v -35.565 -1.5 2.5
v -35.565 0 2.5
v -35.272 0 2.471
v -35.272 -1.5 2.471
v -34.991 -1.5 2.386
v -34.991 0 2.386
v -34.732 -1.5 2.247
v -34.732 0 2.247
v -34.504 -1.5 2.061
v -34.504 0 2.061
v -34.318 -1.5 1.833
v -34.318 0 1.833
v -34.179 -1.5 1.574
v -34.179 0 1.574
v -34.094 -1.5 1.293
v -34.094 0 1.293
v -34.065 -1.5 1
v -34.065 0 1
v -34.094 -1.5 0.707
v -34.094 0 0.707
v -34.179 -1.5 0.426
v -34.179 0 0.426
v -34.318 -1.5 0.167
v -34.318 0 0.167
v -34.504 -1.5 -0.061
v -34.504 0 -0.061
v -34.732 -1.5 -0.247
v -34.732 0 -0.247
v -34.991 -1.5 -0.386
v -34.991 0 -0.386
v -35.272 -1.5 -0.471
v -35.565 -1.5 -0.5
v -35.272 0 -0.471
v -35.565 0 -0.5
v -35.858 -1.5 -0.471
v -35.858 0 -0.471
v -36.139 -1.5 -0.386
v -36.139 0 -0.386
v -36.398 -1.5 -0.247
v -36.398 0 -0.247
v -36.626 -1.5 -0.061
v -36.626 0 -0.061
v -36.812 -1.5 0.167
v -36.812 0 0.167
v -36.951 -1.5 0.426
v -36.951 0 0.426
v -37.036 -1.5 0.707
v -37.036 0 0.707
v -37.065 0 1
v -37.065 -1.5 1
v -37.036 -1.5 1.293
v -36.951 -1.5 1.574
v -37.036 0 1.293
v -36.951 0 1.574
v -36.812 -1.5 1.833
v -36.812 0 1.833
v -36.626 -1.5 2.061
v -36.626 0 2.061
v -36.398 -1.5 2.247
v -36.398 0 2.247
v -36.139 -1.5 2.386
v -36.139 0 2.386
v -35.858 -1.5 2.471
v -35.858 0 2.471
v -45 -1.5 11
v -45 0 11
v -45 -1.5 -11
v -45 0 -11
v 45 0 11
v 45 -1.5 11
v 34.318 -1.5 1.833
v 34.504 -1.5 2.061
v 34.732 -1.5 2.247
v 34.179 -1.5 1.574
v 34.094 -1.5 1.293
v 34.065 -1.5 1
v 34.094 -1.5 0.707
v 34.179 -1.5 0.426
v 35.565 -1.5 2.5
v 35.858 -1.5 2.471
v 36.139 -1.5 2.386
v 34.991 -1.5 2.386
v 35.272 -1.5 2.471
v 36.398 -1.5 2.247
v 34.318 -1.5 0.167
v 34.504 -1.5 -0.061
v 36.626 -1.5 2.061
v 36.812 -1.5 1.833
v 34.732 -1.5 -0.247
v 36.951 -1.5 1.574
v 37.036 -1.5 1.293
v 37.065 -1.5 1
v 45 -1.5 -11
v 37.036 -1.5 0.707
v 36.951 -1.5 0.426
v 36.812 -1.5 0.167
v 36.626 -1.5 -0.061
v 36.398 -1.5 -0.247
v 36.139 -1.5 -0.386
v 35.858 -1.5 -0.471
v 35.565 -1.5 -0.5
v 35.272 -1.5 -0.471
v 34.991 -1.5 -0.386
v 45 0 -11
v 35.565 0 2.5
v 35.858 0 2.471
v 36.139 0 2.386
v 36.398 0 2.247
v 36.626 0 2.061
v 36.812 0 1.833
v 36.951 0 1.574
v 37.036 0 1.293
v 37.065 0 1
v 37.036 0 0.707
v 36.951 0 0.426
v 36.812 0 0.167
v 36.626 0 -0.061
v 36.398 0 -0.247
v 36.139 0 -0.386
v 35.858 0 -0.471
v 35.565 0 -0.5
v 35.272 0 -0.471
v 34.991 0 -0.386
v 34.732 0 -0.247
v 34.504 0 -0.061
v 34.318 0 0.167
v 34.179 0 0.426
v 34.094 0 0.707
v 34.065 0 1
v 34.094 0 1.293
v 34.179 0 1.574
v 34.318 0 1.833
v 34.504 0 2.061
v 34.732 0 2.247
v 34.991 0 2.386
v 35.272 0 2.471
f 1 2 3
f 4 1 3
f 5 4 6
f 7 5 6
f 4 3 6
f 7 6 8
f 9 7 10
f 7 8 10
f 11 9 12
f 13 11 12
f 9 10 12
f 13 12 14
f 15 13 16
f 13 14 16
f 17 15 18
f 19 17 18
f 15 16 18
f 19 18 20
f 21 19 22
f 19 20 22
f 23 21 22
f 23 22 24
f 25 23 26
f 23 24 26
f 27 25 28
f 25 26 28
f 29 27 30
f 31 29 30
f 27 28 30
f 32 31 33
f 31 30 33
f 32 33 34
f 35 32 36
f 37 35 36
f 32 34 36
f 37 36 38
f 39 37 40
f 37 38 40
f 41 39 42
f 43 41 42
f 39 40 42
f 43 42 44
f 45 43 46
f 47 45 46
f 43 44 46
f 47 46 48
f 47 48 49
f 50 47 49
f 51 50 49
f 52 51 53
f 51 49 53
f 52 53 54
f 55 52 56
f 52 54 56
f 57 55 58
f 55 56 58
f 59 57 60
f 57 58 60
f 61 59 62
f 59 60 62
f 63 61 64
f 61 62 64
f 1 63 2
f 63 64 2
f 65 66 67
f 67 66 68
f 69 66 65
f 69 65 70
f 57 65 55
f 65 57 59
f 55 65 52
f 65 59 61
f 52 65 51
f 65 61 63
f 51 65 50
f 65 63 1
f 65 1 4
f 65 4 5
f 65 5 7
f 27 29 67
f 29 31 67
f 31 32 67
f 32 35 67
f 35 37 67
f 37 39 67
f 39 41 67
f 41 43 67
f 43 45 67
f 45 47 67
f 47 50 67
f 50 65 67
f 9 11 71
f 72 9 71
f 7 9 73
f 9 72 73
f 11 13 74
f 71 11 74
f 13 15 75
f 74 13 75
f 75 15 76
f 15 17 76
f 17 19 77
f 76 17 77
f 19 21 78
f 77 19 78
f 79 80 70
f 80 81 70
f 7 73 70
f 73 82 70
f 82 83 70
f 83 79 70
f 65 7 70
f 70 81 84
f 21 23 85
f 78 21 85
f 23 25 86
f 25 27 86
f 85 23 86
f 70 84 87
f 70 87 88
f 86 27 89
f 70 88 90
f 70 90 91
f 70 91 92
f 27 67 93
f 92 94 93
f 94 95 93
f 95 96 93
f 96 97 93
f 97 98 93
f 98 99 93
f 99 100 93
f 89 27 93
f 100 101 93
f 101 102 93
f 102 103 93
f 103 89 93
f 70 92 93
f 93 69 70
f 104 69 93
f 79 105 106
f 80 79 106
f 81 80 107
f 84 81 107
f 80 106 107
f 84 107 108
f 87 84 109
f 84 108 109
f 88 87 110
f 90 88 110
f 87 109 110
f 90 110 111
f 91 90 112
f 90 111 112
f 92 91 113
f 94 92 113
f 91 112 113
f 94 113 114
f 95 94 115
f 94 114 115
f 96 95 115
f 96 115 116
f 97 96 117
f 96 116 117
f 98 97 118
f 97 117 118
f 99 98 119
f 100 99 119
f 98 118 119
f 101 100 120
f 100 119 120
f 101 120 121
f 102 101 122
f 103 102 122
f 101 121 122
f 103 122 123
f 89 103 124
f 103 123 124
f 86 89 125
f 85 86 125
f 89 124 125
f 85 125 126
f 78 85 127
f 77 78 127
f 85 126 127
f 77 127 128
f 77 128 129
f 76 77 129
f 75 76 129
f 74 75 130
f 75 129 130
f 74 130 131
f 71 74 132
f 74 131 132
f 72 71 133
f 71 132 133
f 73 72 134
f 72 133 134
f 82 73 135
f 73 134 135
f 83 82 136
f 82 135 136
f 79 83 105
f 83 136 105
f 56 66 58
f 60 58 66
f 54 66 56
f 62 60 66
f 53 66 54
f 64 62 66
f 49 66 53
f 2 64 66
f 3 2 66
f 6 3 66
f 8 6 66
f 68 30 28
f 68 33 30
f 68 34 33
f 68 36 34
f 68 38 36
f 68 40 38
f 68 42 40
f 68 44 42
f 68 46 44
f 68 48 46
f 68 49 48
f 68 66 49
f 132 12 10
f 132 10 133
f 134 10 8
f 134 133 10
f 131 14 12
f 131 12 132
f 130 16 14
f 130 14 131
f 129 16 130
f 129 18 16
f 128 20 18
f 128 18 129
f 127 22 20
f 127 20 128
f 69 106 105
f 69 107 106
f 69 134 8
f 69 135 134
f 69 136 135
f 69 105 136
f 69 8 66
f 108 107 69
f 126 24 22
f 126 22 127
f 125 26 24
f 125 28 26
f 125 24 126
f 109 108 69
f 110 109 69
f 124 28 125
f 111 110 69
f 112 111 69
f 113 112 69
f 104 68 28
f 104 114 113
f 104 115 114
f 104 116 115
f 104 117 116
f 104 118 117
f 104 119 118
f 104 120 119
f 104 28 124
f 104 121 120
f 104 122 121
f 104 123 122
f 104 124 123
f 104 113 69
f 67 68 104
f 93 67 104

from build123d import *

# Parameters (mm, degrees)
SKETCH1_W           = 90
SKETCH1_H           = 22
SKETCH1_R           = 1.5
BOSS_EXTRUDE1_DEPTH = 1.5


with BuildPart() as part:
    # Sketch1 → Boss-Extrude1 (new body)
    with BuildSketch(Plane(origin=(0, 0, 0), x_dir=(1, 0, 0), z_dir=(0, 1, 0))):
        Rectangle(SKETCH1_W, SKETCH1_H)
        with Locations(Location((35.565, -1, 0), (0, 0, 270))):
            Circle(SKETCH1_R, mode=Mode.SUBTRACT)
        with Locations(Location((-35.565, -1, 0), (0, 0, 270))):
            Circle(SKETCH1_R, mode=Mode.SUBTRACT)
    extrude(amount=-BOSS_EXTRUDE1_DEPTH)


solid = part.part
